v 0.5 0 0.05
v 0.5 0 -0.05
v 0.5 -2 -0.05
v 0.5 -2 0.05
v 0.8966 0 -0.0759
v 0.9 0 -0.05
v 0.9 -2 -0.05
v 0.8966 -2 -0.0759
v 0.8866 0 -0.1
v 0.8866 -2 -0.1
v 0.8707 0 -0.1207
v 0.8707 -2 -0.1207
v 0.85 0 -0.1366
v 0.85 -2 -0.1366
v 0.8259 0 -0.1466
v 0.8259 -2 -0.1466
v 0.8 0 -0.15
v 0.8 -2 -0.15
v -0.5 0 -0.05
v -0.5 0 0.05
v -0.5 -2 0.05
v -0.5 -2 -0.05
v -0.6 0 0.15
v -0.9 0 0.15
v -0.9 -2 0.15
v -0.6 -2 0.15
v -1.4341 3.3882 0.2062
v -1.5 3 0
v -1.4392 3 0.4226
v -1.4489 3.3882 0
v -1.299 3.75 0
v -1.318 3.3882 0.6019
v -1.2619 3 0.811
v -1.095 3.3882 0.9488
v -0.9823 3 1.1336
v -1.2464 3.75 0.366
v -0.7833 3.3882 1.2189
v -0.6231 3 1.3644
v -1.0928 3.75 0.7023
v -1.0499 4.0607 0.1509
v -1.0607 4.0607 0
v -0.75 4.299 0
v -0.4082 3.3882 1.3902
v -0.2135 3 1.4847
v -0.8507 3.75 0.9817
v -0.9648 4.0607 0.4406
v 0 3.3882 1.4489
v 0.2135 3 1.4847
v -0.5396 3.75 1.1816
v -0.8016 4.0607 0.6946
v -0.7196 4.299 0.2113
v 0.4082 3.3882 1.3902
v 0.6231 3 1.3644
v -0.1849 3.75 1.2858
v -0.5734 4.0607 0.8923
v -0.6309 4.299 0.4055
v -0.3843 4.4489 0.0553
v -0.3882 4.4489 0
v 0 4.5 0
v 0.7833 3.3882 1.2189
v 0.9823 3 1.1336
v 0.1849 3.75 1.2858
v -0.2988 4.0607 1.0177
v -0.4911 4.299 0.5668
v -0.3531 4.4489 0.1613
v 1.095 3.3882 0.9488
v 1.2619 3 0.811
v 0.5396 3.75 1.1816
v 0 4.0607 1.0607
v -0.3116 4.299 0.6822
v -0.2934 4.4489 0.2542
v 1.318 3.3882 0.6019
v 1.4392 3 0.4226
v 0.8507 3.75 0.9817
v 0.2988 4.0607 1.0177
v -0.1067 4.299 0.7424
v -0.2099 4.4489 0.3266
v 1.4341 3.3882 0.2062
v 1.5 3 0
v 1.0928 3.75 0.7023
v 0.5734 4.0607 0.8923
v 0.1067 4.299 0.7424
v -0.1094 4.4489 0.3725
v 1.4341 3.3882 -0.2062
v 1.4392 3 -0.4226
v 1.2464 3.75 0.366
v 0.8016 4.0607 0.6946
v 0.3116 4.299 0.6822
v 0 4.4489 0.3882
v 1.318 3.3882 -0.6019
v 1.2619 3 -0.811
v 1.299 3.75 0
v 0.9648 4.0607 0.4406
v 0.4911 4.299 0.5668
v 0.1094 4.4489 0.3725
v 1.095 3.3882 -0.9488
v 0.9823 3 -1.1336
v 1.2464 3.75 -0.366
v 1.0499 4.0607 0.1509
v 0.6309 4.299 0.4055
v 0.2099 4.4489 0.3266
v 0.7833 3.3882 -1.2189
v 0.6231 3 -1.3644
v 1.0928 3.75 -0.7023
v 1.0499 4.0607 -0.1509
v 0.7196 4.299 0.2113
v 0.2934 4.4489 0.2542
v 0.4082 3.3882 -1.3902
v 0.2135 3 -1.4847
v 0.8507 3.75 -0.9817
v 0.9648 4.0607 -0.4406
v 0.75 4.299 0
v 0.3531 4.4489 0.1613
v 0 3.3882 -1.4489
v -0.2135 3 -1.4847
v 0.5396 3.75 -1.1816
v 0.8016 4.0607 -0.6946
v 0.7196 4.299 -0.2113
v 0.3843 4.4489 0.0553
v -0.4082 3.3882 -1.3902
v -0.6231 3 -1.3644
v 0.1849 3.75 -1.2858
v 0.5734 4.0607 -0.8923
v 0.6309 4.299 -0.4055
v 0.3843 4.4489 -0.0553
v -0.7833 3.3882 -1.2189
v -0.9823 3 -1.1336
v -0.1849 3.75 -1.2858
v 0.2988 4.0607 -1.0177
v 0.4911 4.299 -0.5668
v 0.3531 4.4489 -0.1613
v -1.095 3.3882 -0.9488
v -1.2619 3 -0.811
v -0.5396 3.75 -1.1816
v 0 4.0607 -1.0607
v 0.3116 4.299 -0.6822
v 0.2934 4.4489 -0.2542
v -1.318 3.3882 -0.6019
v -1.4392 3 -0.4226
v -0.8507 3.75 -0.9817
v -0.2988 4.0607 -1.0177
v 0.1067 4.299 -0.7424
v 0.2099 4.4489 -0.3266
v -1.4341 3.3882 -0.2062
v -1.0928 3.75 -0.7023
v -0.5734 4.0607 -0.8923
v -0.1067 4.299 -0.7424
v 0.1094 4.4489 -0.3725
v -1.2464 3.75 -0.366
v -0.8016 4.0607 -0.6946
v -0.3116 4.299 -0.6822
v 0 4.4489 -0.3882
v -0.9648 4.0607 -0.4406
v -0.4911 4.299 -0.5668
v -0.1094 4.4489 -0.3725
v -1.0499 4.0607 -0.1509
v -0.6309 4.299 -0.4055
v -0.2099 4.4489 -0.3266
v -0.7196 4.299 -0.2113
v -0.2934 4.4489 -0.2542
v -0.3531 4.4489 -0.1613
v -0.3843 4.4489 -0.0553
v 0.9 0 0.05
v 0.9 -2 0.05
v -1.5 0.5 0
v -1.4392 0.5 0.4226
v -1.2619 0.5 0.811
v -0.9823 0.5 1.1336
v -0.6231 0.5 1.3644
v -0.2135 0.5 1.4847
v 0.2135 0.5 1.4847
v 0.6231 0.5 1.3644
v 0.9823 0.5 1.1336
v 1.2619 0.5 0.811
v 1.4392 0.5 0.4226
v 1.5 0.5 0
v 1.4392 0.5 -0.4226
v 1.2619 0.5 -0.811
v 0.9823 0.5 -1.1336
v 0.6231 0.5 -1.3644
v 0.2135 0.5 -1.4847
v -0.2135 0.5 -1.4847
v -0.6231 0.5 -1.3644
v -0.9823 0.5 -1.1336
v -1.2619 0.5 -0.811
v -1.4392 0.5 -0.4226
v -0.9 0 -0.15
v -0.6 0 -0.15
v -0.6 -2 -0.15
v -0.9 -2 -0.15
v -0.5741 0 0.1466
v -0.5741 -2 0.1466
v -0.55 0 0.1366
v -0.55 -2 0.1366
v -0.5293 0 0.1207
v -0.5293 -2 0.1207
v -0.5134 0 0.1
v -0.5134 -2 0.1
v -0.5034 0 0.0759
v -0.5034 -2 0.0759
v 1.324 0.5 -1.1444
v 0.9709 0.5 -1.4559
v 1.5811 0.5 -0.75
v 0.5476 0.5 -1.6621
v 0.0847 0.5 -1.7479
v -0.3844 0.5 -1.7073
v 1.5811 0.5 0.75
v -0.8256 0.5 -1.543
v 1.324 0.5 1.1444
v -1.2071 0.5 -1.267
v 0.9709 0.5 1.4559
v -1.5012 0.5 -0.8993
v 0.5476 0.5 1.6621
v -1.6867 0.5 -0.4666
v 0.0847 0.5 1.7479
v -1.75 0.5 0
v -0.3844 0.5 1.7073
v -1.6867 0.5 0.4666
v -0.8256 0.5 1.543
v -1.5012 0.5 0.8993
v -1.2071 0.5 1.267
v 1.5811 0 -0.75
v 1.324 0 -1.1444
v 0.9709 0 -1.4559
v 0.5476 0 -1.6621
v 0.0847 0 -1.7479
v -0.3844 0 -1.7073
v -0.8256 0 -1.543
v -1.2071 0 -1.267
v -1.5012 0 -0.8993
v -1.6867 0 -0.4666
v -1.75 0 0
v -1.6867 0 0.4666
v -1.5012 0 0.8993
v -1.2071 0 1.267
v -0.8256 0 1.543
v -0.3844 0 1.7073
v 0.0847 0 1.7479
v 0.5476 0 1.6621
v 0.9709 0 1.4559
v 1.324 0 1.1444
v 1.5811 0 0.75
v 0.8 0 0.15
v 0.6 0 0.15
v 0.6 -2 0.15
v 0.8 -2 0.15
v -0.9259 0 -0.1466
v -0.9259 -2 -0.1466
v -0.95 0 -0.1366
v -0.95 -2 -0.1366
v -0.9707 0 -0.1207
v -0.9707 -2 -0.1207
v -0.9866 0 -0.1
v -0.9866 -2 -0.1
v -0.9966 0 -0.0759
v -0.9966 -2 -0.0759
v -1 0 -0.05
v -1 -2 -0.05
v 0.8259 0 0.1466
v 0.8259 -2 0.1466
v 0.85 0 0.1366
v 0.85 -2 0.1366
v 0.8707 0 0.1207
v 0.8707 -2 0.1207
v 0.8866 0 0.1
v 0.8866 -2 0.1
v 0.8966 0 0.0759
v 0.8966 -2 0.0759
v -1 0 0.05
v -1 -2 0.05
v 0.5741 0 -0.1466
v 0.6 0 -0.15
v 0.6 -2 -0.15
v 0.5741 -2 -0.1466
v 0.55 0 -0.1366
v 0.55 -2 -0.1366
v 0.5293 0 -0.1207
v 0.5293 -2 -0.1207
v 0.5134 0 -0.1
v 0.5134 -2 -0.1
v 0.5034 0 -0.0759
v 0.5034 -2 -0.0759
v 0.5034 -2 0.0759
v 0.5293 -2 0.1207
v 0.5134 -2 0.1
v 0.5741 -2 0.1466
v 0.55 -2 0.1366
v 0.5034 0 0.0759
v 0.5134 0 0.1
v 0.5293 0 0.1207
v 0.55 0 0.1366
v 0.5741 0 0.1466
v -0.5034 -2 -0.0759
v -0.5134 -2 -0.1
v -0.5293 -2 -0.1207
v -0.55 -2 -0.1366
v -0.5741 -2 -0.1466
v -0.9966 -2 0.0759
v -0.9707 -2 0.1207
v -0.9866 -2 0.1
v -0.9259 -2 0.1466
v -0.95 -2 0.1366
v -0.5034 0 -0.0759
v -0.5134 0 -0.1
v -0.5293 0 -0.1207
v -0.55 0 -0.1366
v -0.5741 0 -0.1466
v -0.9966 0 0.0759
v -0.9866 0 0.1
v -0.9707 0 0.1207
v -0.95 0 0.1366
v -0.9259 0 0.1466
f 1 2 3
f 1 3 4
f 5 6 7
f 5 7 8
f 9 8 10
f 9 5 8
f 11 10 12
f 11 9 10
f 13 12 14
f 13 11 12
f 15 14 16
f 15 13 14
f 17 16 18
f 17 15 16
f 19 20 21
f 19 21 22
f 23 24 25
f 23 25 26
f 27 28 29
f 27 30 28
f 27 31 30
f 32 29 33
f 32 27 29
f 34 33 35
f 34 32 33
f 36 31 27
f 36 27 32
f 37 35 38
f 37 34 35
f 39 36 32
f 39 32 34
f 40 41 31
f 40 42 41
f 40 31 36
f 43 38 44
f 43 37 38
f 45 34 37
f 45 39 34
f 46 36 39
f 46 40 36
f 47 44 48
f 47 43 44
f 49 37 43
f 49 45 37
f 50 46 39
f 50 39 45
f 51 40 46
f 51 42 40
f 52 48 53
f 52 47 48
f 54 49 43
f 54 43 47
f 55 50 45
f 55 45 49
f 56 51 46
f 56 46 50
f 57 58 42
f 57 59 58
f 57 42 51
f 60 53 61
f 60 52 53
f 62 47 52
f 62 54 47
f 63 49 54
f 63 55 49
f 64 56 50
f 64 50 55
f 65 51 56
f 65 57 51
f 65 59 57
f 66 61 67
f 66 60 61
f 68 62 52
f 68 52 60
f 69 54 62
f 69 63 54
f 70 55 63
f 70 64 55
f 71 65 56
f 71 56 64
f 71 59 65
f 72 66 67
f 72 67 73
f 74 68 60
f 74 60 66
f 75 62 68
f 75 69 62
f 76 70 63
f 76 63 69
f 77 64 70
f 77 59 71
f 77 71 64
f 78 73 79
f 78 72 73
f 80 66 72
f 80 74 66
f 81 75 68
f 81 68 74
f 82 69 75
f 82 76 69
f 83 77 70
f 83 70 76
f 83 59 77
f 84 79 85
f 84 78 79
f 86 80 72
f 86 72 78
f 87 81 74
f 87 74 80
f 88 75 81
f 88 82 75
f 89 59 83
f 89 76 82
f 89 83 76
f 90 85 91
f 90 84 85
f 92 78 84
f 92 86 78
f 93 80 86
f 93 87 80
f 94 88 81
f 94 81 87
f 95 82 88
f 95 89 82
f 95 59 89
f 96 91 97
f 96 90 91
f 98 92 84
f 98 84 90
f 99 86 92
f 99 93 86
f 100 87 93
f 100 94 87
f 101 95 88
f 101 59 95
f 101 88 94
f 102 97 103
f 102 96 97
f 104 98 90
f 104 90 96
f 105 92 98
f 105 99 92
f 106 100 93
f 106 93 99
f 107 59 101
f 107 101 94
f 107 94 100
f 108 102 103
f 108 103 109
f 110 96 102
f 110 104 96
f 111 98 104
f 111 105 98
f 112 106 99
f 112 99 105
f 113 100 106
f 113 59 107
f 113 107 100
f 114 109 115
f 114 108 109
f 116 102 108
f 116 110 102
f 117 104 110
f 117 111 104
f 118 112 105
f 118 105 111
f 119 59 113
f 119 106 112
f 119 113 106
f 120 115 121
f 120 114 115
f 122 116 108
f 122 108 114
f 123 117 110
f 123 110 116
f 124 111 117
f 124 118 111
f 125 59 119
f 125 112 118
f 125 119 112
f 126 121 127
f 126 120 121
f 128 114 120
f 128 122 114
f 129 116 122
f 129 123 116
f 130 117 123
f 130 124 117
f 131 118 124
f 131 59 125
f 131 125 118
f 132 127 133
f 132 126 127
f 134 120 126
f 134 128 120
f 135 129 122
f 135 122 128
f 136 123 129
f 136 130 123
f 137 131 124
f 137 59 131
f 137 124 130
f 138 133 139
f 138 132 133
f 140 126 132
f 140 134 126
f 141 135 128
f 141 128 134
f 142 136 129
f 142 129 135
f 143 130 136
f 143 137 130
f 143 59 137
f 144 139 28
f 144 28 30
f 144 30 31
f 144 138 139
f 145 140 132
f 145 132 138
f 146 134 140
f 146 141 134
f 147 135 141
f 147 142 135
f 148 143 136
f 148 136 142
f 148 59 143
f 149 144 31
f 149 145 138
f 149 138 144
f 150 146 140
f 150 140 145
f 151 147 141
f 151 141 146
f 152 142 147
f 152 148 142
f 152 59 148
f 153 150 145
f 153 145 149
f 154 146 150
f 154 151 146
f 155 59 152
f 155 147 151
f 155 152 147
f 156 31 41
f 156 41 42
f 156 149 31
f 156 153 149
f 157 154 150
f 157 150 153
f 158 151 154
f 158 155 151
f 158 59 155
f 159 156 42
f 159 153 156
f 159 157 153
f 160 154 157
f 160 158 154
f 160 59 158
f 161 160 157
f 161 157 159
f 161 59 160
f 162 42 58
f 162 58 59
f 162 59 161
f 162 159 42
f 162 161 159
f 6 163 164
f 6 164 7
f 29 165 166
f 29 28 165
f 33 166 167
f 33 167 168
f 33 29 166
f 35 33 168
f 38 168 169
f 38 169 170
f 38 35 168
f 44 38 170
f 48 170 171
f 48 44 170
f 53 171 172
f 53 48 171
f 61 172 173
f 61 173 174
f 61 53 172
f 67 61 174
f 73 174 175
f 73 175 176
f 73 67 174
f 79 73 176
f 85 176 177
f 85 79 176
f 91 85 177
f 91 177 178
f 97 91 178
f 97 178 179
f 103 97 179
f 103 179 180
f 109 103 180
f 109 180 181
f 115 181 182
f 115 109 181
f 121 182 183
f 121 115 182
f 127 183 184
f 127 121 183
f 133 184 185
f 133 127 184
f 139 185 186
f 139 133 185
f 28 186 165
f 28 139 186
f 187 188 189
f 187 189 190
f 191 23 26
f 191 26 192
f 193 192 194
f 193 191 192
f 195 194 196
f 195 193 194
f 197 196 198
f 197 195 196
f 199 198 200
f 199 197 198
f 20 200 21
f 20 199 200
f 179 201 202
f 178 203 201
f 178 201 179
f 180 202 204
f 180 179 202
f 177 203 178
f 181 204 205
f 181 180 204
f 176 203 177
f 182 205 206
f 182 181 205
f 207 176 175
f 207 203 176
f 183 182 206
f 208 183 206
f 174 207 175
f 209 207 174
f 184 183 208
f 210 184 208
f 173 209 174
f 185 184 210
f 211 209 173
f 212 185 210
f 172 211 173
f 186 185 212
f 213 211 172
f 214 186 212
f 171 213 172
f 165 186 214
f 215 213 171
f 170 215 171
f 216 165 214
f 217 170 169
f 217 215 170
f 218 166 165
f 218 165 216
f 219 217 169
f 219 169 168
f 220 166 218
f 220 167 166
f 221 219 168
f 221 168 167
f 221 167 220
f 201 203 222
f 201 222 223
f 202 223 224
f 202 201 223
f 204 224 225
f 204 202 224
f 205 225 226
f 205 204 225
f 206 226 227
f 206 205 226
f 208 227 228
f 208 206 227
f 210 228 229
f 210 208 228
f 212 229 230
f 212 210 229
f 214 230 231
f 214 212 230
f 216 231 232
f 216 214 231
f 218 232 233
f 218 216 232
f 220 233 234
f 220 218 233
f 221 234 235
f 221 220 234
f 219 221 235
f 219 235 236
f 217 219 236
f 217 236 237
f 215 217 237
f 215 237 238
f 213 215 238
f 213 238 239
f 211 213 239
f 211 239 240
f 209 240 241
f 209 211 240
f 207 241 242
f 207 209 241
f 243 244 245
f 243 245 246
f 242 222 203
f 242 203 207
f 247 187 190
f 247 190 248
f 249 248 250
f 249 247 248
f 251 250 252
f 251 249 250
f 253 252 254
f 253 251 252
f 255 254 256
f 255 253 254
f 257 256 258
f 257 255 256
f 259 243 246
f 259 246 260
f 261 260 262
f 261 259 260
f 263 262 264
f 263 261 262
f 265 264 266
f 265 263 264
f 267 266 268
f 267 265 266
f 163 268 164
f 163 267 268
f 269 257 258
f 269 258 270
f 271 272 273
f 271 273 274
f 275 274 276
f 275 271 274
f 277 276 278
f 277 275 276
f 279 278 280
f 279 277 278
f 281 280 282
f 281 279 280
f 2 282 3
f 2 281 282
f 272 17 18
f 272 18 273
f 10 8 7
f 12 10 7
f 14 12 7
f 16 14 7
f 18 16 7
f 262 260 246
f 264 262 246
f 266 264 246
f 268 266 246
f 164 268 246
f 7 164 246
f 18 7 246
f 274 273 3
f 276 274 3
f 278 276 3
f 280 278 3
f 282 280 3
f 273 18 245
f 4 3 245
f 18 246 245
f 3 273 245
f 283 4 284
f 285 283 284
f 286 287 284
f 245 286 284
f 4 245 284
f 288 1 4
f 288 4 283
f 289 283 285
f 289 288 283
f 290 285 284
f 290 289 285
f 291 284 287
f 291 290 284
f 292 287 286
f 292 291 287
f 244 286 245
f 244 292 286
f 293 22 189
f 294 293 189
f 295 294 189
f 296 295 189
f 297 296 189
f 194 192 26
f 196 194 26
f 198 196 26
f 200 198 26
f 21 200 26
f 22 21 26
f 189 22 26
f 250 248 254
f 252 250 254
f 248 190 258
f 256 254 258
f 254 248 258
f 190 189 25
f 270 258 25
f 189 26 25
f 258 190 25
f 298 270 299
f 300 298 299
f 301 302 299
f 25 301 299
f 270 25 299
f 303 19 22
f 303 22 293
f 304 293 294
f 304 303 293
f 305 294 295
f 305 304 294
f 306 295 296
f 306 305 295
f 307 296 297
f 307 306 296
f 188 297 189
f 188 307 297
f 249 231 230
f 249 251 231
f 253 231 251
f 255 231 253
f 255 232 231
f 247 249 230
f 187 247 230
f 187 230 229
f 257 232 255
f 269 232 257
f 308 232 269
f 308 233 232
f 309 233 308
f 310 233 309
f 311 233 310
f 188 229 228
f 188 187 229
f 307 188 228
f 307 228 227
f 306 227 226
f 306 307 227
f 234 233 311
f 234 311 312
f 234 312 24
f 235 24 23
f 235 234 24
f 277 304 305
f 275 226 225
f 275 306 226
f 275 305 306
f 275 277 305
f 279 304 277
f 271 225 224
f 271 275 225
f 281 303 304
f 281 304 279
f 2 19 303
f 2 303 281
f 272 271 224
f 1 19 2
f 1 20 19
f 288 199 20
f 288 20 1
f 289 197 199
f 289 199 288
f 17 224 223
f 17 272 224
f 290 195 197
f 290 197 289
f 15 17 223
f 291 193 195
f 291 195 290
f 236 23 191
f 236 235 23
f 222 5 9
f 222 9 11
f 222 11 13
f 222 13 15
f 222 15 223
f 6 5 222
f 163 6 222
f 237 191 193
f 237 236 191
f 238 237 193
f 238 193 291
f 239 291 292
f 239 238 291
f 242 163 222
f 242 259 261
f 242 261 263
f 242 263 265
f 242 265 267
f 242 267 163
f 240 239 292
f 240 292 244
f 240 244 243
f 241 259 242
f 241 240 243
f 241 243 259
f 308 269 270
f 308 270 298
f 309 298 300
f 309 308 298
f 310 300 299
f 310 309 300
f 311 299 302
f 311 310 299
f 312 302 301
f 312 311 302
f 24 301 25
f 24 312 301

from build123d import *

# Parameters (mm, degrees)
SCHNITT_LINEAR_AUSTRAGEN1_DEPTH = 1
LINEAR_AUSTRAGEN1_DEPTH         = 2


with BuildPart() as part:
    # Skizze2 → Rotation1 (revolve)
    with BuildSketch(Plane.XY):
        with BuildLine():
            Line((0, 0), (-1.75, 0))
            Line((-1.75, 0), (-1.75, 0.5))
            Line((-1.75, 0.5), (-1.5, 0.5))
            Line((-1.5, 0.5), (-1.5, 3))
            ThreePointArc((-1.5, 3), (-1.060660172, 4.060660172), (0, 4.5))
            Line((0, 4.5), (0, 0))
        make_face()
    revolve(axis=Axis((0, 0, 0), (0, 1, 0)))

    # Skizze3 → Schnitt-Linear austragen1 (cut)
    with BuildSketch(Plane.XZ):
        with BuildLine():
            Line((1.58113883, -0.75), (1.58113883, 0.75))
            ThreePointArc((1.58113883, 0.75), (1.75, 0), (1.58113883, -0.75))
        make_face()
    extrude(amount=-SCHNITT_LINEAR_AUSTRAGEN1_DEPTH, mode=Mode.SUBTRACT)

    # Skizze4 → Linear austragen1 (add)
    with BuildSketch(Plane.XZ):
        with BuildLine():
            Line((0.6, 0.15), (0.8, 0.15))
            ThreePointArc((0.8, 0.15), (0.870710678, 0.120710678), (0.9, 0.05))
            Line((0.9, 0.05), (0.9, -0.05))
            ThreePointArc((0.9, -0.05), (0.870710678, -0.120710678), (0.8, -0.15))
            Line((0.8, -0.15), (0.6, -0.15))
            ThreePointArc((0.6, -0.15), (0.529289322, -0.120710678), (0.5, -0.05))
            Line((0.5, -0.05), (0.5, 0.05))
            ThreePointArc((0.5, 0.05), (0.529289322, 0.120710678), (0.6, 0.15))
        make_face()
        with BuildLine():
            Line((-0.9, 0.15), (-0.6, 0.15))
            ThreePointArc((-0.6, 0.15), (-0.529289322, 0.120710678), (-0.5, 0.05))
            Line((-0.5, 0.05), (-0.5, -0.05))
            ThreePointArc((-0.5, -0.05), (-0.529289322, -0.120710678), (-0.6, -0.15))
            Line((-0.6, -0.15), (-0.9, -0.15))
            ThreePointArc((-0.9, -0.15), (-0.970710678, -0.120710678), (-1, -0.05))
            Line((-1, -0.05), (-1, 0.05))
            ThreePointArc((-1, 0.05), (-0.970710678, 0.120710678), (-0.9, 0.15))
        make_face()
    extrude(amount=LINEAR_AUSTRAGEN1_DEPTH)


solid = part.part
